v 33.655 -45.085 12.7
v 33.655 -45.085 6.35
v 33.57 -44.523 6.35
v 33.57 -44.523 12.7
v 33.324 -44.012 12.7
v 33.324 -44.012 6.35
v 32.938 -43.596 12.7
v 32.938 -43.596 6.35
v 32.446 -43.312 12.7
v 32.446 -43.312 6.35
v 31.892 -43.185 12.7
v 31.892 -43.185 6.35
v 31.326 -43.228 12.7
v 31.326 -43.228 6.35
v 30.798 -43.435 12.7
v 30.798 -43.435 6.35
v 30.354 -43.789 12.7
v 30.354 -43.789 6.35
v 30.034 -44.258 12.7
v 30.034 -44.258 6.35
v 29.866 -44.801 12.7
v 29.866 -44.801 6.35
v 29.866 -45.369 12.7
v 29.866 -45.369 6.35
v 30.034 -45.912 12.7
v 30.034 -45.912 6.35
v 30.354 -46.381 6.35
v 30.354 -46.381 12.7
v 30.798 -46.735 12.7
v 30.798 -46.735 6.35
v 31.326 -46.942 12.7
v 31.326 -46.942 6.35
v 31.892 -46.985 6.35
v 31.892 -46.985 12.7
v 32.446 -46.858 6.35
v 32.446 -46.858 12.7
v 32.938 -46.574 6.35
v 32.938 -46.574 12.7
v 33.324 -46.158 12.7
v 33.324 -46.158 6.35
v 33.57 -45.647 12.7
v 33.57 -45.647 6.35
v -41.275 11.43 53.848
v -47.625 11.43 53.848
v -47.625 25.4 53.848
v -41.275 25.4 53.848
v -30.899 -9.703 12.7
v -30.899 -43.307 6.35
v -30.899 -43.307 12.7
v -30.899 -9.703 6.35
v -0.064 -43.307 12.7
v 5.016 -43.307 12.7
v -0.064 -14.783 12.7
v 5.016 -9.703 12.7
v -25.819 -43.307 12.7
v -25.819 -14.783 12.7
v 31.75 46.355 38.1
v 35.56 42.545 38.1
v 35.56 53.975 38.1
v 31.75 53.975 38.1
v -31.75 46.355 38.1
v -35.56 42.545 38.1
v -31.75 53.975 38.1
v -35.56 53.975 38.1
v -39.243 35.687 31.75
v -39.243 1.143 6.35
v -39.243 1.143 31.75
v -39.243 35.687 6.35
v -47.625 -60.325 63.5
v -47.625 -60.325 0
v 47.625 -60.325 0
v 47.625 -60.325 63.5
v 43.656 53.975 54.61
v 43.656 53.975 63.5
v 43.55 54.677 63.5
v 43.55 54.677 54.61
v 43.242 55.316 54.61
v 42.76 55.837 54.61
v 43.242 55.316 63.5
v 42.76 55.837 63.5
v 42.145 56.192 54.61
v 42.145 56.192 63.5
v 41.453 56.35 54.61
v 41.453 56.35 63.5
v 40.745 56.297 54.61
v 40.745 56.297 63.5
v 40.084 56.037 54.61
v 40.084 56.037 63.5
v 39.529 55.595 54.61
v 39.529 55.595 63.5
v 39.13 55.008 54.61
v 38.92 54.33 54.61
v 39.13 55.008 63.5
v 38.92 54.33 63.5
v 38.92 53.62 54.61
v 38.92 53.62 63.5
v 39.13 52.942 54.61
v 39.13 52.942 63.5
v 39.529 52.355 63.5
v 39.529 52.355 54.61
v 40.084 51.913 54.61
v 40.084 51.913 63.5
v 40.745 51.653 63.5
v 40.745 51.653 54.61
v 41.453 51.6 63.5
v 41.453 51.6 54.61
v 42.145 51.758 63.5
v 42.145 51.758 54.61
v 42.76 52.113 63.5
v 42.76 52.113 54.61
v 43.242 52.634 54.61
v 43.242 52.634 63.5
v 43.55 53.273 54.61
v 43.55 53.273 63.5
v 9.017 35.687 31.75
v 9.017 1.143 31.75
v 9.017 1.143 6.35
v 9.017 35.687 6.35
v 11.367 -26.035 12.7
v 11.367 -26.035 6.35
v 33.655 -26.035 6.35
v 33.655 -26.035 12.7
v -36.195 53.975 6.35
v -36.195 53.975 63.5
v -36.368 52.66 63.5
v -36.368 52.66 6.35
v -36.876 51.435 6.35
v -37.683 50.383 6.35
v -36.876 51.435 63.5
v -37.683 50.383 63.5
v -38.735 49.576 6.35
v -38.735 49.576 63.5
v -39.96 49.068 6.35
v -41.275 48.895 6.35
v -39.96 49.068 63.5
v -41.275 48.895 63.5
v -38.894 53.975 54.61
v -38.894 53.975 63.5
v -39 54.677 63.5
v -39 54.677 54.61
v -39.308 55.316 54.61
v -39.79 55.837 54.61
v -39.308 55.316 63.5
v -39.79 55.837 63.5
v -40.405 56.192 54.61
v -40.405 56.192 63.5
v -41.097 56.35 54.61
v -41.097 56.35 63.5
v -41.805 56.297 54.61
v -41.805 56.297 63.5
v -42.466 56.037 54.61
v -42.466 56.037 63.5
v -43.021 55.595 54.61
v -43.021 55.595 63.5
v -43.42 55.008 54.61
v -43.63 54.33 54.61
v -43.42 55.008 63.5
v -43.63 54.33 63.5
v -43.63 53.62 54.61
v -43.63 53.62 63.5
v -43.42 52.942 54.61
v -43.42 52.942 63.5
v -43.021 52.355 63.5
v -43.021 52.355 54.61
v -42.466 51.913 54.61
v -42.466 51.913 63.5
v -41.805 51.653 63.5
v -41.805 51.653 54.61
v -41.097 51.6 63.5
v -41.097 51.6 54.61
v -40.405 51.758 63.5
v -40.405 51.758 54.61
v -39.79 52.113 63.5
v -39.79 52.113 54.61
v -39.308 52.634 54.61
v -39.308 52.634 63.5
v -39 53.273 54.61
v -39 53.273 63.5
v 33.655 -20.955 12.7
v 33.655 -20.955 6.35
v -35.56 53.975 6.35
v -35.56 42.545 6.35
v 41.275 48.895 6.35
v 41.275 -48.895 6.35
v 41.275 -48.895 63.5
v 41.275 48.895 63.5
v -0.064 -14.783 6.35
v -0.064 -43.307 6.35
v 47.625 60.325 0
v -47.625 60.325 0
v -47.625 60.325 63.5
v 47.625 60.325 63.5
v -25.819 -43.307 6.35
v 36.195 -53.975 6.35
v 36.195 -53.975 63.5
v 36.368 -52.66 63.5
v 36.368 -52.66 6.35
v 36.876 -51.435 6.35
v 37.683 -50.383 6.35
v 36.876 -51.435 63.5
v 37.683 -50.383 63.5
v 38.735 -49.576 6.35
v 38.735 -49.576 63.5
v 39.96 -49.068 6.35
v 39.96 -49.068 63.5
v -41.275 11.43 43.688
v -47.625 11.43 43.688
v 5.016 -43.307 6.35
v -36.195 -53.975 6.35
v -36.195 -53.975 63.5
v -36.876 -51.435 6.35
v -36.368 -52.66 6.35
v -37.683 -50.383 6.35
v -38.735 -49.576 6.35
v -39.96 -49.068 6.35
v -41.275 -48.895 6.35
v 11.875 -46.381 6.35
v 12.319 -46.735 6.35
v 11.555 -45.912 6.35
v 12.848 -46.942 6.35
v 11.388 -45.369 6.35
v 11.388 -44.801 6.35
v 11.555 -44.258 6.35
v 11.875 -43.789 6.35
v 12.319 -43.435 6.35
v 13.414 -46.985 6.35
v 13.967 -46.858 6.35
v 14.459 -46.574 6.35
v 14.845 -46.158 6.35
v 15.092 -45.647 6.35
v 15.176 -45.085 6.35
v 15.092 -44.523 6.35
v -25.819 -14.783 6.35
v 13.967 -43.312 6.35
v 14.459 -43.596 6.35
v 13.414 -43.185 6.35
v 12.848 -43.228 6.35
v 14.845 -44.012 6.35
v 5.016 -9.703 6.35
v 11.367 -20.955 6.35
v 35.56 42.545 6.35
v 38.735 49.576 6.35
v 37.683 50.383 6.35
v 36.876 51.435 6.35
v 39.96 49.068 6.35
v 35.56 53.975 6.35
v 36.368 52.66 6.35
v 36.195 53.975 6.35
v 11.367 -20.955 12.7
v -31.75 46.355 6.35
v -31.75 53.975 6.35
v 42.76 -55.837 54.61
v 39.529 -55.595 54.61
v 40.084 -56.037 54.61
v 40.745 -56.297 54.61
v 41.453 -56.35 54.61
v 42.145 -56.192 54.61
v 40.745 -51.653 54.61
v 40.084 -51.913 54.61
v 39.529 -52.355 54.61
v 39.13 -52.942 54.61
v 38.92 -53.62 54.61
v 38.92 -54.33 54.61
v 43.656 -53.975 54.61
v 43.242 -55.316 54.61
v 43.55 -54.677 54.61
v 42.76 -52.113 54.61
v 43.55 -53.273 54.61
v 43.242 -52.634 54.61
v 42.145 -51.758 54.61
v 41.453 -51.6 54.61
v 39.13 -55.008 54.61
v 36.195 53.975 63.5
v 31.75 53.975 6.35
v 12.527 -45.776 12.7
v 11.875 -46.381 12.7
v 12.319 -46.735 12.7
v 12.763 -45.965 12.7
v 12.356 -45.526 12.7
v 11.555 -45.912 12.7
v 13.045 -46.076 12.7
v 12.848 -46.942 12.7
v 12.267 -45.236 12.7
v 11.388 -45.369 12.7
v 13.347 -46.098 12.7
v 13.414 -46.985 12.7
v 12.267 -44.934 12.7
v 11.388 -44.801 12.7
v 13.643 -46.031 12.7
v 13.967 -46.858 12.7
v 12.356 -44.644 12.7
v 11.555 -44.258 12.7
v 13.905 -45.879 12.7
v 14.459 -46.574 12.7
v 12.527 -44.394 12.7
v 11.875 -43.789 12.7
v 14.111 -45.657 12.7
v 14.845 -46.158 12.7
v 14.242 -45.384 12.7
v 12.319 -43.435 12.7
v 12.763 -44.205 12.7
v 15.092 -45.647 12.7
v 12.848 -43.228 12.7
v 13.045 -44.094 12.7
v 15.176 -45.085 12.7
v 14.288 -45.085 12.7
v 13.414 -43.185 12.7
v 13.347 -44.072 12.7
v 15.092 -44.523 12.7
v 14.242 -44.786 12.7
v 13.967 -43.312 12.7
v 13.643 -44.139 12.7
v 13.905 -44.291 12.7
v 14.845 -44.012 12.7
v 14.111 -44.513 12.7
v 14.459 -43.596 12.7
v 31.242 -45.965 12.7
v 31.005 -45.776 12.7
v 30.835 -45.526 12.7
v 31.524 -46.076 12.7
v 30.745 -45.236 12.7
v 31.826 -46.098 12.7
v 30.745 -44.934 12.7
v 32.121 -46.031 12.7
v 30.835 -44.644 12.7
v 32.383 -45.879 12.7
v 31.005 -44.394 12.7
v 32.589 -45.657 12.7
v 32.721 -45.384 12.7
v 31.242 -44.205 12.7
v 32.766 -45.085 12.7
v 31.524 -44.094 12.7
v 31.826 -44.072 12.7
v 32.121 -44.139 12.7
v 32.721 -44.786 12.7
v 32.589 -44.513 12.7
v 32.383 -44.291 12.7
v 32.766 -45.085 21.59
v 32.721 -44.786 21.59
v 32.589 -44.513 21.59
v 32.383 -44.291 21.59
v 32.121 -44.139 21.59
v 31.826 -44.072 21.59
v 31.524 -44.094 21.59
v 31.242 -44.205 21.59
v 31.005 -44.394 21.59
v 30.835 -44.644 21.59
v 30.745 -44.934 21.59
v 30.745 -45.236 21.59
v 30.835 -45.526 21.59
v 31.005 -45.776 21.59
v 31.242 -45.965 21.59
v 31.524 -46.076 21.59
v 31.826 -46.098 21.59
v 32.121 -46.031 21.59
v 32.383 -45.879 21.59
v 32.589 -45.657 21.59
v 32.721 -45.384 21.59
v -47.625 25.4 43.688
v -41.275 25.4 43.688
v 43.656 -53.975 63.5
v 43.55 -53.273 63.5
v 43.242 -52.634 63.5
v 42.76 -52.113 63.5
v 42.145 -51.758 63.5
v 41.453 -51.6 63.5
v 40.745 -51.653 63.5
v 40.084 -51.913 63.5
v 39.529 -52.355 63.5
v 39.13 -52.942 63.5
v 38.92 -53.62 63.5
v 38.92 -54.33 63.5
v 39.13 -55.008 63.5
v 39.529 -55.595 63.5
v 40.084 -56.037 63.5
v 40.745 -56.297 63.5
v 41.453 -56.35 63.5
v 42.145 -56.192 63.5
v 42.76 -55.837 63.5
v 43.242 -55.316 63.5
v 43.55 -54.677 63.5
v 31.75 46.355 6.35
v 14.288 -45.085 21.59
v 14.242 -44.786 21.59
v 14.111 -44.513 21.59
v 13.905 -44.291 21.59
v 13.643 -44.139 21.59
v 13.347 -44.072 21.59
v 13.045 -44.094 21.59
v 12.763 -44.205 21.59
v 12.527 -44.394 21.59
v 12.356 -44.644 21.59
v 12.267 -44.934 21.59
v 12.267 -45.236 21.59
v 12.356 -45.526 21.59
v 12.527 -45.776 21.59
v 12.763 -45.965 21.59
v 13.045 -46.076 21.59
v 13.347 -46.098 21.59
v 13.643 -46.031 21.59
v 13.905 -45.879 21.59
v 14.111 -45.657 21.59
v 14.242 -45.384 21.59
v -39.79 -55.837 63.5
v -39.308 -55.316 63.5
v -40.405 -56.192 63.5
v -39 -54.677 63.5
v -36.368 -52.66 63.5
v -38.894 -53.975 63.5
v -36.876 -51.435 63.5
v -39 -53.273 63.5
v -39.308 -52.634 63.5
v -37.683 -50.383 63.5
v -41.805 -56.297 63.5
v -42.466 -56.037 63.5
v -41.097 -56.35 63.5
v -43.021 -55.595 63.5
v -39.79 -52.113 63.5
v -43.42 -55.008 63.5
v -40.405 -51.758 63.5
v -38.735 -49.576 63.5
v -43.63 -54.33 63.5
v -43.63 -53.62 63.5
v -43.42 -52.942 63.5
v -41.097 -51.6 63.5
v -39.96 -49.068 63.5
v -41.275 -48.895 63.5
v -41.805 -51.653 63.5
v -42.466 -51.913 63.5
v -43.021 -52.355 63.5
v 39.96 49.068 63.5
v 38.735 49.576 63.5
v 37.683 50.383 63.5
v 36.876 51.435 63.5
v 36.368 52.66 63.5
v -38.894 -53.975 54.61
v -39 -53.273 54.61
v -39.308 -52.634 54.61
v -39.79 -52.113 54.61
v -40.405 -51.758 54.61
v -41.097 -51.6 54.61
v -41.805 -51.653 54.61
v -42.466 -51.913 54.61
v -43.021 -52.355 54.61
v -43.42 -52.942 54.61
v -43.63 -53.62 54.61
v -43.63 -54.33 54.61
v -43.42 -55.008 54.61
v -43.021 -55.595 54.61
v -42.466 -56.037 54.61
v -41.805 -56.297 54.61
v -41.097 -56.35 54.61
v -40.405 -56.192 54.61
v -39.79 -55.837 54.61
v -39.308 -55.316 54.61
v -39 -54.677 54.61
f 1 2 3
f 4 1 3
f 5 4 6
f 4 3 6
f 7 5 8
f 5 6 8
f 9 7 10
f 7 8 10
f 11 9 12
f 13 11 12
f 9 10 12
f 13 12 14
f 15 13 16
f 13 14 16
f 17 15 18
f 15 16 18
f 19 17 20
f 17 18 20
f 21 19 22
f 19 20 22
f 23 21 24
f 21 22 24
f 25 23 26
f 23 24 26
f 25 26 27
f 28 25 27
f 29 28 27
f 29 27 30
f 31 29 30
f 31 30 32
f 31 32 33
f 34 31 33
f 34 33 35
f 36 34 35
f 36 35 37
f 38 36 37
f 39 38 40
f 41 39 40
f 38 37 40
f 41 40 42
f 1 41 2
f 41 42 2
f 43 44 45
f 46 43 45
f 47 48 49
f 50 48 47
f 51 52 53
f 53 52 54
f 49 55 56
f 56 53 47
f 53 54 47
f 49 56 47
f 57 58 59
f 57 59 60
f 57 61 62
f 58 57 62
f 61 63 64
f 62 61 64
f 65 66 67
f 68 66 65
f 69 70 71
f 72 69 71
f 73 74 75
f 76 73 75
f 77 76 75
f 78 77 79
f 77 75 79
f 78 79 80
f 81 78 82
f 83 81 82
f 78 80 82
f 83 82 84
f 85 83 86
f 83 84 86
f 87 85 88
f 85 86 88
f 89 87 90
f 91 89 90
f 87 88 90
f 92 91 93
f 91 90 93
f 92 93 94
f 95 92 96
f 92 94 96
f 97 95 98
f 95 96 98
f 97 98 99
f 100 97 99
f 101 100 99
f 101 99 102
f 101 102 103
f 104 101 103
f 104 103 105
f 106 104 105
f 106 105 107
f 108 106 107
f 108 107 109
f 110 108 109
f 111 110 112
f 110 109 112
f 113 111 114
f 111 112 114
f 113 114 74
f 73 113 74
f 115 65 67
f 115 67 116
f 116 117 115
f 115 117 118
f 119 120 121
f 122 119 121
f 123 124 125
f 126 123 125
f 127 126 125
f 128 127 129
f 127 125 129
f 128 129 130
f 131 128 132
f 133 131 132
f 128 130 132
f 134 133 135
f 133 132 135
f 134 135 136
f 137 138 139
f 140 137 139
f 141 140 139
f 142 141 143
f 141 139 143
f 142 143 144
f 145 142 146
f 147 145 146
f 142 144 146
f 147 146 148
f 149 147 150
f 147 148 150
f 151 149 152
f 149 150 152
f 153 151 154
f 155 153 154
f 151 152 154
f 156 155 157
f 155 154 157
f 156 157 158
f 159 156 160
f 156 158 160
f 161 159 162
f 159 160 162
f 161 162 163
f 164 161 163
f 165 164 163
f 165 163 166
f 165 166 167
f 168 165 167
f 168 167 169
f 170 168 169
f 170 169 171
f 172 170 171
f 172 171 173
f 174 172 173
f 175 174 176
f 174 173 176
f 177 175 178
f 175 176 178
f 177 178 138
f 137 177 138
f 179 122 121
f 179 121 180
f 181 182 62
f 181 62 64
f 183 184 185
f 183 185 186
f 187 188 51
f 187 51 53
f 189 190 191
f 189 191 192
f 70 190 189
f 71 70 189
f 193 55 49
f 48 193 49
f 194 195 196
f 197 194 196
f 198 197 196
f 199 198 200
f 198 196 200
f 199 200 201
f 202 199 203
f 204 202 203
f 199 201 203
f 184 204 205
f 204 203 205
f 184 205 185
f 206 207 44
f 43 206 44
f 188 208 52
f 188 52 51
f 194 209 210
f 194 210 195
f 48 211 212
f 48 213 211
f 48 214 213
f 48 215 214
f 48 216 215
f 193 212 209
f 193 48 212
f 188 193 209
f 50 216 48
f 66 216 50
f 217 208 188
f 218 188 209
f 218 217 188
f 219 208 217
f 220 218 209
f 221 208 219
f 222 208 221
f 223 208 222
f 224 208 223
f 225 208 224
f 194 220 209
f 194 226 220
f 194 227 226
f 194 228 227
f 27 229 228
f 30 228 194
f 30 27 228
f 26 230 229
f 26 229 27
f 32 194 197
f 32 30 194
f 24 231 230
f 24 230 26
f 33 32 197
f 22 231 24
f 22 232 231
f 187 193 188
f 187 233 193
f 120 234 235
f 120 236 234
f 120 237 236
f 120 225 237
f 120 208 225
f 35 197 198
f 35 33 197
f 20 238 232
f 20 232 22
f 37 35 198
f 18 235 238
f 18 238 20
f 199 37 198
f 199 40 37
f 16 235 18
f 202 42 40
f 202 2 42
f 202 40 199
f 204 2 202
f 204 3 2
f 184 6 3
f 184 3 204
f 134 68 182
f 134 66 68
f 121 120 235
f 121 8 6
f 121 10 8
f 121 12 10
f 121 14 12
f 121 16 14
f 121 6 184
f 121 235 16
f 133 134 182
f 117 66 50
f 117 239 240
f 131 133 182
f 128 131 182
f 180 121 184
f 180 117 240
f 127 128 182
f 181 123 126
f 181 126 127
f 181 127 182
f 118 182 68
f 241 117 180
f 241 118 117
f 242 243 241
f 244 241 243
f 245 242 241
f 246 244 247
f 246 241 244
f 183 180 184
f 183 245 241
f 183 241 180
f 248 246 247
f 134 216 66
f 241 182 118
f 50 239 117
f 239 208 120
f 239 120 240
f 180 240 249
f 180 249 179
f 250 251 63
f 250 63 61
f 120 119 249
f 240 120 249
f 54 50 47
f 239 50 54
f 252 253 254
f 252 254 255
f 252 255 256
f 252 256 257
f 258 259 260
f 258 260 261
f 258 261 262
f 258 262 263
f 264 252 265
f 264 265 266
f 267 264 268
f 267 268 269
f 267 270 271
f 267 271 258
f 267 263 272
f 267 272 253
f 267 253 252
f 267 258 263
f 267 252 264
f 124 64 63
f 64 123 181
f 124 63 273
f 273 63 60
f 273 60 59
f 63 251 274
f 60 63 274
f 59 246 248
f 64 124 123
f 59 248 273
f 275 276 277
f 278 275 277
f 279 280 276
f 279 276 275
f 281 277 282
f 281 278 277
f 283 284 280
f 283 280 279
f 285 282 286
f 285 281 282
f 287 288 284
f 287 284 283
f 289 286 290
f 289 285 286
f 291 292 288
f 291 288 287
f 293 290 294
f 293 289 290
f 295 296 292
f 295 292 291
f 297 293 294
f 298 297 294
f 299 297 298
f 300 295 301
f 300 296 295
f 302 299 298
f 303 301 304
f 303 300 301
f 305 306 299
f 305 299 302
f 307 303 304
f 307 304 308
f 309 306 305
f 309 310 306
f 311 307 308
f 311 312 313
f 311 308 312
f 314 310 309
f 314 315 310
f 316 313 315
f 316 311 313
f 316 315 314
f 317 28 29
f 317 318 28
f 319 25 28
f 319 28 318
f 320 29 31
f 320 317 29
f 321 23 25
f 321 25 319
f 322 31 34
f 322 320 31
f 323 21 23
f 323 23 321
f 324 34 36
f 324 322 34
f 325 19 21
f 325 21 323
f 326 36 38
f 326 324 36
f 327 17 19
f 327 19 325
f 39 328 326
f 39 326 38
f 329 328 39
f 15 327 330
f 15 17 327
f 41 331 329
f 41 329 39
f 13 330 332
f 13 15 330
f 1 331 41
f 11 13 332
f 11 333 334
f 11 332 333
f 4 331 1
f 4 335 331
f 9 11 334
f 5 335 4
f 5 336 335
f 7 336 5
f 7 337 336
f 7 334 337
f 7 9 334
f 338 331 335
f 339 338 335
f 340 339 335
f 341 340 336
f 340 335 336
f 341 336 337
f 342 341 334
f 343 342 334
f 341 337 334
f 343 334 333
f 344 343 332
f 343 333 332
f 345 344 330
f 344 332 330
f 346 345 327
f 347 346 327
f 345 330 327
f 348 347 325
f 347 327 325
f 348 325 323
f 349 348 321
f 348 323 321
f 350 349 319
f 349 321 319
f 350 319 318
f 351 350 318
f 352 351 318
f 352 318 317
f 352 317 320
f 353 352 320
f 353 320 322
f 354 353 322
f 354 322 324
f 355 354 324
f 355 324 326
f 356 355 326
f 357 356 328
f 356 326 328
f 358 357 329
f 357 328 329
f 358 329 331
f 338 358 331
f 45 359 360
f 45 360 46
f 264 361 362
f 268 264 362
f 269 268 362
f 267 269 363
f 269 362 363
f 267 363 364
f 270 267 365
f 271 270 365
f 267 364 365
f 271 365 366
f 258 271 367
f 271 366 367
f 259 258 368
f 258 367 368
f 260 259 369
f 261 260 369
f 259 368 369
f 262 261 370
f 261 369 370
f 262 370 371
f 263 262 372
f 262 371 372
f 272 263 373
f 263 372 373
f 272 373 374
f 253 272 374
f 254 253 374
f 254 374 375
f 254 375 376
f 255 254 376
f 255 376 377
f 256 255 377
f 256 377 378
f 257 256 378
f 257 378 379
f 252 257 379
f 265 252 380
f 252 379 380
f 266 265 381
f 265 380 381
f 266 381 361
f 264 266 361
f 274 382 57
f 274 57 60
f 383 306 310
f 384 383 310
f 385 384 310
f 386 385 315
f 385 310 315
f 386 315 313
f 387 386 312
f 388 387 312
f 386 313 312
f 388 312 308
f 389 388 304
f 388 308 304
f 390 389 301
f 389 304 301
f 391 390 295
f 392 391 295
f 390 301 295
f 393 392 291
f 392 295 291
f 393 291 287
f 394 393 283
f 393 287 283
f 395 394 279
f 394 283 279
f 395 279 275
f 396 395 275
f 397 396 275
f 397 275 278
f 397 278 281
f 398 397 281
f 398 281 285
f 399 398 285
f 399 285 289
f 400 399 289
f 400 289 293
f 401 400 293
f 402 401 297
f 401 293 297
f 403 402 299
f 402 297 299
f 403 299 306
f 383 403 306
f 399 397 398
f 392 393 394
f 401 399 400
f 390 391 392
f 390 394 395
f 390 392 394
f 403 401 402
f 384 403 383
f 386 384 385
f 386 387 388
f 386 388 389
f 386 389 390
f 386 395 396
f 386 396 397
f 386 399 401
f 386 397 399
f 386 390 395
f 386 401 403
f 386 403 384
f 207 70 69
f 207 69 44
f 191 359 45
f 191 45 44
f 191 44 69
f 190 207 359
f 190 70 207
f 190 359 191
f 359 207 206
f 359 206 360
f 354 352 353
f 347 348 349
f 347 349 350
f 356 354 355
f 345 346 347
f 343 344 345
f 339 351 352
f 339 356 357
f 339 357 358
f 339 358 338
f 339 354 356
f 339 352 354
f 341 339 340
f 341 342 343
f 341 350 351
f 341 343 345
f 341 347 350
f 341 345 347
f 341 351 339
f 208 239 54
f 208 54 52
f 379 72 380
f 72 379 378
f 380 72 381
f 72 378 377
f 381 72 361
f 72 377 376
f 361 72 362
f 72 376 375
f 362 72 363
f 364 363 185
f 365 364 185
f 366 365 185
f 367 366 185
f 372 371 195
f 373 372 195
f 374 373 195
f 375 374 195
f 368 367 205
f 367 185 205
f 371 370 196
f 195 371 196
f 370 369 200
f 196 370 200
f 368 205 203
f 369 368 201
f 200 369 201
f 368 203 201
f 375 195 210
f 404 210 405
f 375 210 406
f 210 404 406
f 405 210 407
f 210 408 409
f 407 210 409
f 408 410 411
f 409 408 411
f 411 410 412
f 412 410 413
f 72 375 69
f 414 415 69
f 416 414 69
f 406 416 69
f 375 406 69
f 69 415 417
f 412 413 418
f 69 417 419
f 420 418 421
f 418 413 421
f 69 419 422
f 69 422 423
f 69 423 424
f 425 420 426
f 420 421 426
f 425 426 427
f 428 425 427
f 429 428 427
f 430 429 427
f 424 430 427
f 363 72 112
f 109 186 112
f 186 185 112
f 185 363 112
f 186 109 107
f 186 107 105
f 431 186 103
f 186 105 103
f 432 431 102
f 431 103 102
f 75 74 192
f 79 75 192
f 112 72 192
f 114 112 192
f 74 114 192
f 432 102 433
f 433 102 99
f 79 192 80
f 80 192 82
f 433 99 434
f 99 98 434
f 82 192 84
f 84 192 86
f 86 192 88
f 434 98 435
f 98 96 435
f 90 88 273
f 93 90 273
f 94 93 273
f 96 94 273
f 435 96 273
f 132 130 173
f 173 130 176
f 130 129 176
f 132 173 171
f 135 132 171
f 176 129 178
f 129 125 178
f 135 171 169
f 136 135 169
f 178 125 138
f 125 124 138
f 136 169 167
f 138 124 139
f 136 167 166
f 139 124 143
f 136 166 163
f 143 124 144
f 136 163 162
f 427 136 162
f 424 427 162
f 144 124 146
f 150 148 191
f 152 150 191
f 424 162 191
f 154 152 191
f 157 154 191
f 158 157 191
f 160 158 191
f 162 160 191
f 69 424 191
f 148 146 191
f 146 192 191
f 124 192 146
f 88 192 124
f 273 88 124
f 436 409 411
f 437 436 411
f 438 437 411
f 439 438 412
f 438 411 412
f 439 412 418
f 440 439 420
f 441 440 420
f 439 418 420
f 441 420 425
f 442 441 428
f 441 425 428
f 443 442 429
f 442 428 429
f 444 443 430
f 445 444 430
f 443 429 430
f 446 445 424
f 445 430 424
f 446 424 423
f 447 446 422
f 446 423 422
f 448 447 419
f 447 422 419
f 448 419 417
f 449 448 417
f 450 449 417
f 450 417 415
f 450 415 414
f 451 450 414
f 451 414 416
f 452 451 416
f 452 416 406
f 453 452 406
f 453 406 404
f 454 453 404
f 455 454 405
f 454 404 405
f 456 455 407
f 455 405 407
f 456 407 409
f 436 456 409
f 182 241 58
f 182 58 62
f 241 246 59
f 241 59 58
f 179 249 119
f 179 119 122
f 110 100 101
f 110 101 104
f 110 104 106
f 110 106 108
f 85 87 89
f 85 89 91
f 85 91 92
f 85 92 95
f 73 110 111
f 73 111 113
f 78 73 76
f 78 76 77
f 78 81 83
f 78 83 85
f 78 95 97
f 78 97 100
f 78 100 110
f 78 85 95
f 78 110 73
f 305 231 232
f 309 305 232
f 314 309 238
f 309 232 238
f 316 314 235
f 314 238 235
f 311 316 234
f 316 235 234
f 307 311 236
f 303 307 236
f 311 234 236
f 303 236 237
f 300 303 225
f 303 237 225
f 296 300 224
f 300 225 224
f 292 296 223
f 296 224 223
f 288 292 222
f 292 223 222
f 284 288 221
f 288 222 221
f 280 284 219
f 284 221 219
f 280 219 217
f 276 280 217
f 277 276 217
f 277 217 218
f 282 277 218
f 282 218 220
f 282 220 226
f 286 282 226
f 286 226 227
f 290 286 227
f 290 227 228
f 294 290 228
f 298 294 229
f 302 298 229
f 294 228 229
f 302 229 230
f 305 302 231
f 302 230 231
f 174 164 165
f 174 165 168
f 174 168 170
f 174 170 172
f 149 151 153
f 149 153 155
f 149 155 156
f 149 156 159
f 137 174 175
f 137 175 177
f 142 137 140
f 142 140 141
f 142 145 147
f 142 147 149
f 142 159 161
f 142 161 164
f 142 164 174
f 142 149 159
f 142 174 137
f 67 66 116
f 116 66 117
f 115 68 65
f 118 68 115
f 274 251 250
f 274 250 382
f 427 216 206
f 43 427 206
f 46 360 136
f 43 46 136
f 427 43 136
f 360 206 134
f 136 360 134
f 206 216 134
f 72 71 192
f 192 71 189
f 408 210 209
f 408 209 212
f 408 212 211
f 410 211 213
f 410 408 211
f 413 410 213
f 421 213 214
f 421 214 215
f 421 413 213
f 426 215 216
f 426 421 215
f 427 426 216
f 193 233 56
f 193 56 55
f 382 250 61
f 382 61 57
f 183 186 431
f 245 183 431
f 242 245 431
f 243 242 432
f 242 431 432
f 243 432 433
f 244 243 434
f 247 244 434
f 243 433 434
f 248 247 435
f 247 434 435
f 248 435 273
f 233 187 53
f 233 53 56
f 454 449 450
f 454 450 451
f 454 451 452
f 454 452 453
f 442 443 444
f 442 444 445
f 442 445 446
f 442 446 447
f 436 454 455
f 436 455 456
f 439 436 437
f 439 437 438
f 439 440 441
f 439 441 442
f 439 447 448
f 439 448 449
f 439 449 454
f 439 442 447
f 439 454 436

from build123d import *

# Parameters (mm, degrees)
SKETCH1_W           = 95.25
SKETCH1_H           = 120.65
BOSS_EXTRUDE1_DEPTH = 63.5
SHELL1_T            = -6.35
BOSS_EXTRUDE2_DEPTH = 57.15
SKETCH5_R           = 1.905
SKETCH5_W           = 22.2885
SKETCH5_H           = 5.08
BOSS_EXTRUDE5_DEPTH = 6.35
SKETCH7_R           = 1.016
BOSS_EXTRUDE6_DEPTH = 8.89
SKETCH8_R           = 2.38125
CUT_EXTRUDE1_DEPTH  = 8.89
BOSS_EXTRUDE7_DEPTH = 6.35
CUT_EXTRUDE3_REACH  = 97.25
SKETCH13_W          = 10.16
SKETCH13_H          = 13.97
BOSS_EXTRUDE8_DEPTH = 31.75
SKETCH16_W          = 48.26
SKETCH16_H          = 34.544
BOSS_EXTRUDE9_DEPTH = 25.4


with BuildPart() as part:
    # Sketch1 → Boss-Extrude1 (new body)
    with BuildSketch(Plane.XY):
        Rectangle(SKETCH1_W, SKETCH1_H)
    extrude(amount=BOSS_EXTRUDE1_DEPTH)

    # Shell1
    shell1_openings = [part.faces().sort_by_distance(p)[0] for p in [
        (0, 0, 63.5),
    ]]
    offset(amount=SHELL1_T, openings=shell1_openings, kind=Kind.INTERSECTION)

    # Sketch2 → Boss-Extrude2 (add)
    with BuildSketch(Plane.XY.offset(63.5)):
        with BuildLine():
            Line((-41.275, 53.975), (-36.195, 53.975))
            ThreePointArc((-36.195, 53.975), (-37.682897552, 50.382897552), (-41.275, 48.895))
            Line((-41.275, 48.895), (-41.275, 53.975))
        make_face()
        with BuildLine():
            Line((36.195, 53.975), (41.275, 53.975))
            Line((41.275, 53.975), (41.275, 48.895))
            ThreePointArc((41.275, 48.895), (37.682897552, 50.382897552), (36.195, 53.975))
        make_face()
        with BuildLine():
            Line((41.275, -48.895), (41.275, -53.975))
            Line((41.275, -53.975), (36.195, -53.975))
            ThreePointArc((36.195, -53.975), (37.682897552, -50.382897552), (41.275, -48.895))
        make_face()
        with BuildLine():
            Line((-41.275, -48.895), (-41.275, -53.975))
            Line((-41.275, -53.975), (-36.195, -53.975))
            ThreePointArc((-36.195, -53.975), (-37.682897552, -50.382897552), (-41.275, -48.895))
        make_face()
    extrude(amount=-BOSS_EXTRUDE2_DEPTH)

    # Sketch5 → Boss-Extrude5 (add)
    with BuildSketch(Plane.XY.offset(6.35)):
        with Locations((13.2715, -45.085)):
            Circle(SKETCH5_R)
        with Locations((31.75, -45.085)):
            Circle(SKETCH5_R)
        with Locations((22.51075, -23.495)):
            Rectangle(SKETCH5_W, SKETCH5_H)
    extrude(amount=BOSS_EXTRUDE5_DEPTH)

    # Sketch7 → Boss-Extrude6 (add)
    with BuildSketch(Plane.XY.offset(12.7)):
        with Locations((13.2715, -45.085)):
            Circle(SKETCH7_R)
        with Locations((31.75, -45.085)):
            Circle(SKETCH7_R)
    extrude(amount=BOSS_EXTRUDE6_DEPTH)

    # Sketch8 → Cut-Extrude1 (cut)
    with BuildSketch(Plane.XY.offset(63.5)):
        with Locations((-41.275, 53.975)):
            Circle(SKETCH8_R)
        with Locations((41.275, 53.975)):
            Circle(SKETCH8_R)
        with Locations((41.275, -53.975)):
            Circle(SKETCH8_R)
        with Locations((-41.275, -53.975)):
            Circle(SKETCH8_R)
    extrude(amount=-CUT_EXTRUDE1_DEPTH, mode=Mode.SUBTRACT)

    # Sketch10 → Boss-Extrude7 (add)
    with BuildSketch(Plane.XY.offset(6.35)):
        Polygon((-30.8991, -43.307), (-30.8991, -9.7028), (5.0165, -9.7028), (5.0165, -43.307), (-0.0635, -43.307), (-0.0635, -14.7828), (-25.8191, -14.7828), (-25.8191, -43.307), align=None)
    extrude(amount=BOSS_EXTRUDE7_DEPTH)

    # Sketch13 → Cut-Extrude3 (cut, up to next)
    with BuildSketch(Plane.ZY.offset(47.625), mode=Mode.PRIVATE) as cut_extrude3_sk1:
        with Locations((48.768, 18.415)):
            Rectangle(SKETCH13_W, SKETCH13_H)
    cut_extrude3_tool1 = extrude(cut_extrude3_sk1.sketch, amount=-CUT_EXTRUDE3_REACH, mode=Mode.PRIVATE) & part.part
    add(cut_extrude3_tool1.solids().sort_by_distance((-47.625, 18.415, 48.768))[0], mode=Mode.SUBTRACT)

    # Sketch15 → Boss-Extrude8 (add)
    with BuildSketch(Plane.XY.offset(6.35)):
        Polygon((-31.75, 53.975), (-31.75, 46.355), (31.75, 46.355), (31.75, 53.975), (35.56, 53.975), (35.56, 42.545), (-35.56, 42.545), (-35.56, 53.975), align=None)
    extrude(amount=BOSS_EXTRUDE8_DEPTH)

    # Sketch16 → Boss-Extrude9 (add)
    with BuildSketch(Plane.XY.offset(6.35)):
        with Locations((-15.113, 18.415)):
            Rectangle(SKETCH16_W, SKETCH16_H)
    extrude(amount=BOSS_EXTRUDE9_DEPTH)


solid = part.part
